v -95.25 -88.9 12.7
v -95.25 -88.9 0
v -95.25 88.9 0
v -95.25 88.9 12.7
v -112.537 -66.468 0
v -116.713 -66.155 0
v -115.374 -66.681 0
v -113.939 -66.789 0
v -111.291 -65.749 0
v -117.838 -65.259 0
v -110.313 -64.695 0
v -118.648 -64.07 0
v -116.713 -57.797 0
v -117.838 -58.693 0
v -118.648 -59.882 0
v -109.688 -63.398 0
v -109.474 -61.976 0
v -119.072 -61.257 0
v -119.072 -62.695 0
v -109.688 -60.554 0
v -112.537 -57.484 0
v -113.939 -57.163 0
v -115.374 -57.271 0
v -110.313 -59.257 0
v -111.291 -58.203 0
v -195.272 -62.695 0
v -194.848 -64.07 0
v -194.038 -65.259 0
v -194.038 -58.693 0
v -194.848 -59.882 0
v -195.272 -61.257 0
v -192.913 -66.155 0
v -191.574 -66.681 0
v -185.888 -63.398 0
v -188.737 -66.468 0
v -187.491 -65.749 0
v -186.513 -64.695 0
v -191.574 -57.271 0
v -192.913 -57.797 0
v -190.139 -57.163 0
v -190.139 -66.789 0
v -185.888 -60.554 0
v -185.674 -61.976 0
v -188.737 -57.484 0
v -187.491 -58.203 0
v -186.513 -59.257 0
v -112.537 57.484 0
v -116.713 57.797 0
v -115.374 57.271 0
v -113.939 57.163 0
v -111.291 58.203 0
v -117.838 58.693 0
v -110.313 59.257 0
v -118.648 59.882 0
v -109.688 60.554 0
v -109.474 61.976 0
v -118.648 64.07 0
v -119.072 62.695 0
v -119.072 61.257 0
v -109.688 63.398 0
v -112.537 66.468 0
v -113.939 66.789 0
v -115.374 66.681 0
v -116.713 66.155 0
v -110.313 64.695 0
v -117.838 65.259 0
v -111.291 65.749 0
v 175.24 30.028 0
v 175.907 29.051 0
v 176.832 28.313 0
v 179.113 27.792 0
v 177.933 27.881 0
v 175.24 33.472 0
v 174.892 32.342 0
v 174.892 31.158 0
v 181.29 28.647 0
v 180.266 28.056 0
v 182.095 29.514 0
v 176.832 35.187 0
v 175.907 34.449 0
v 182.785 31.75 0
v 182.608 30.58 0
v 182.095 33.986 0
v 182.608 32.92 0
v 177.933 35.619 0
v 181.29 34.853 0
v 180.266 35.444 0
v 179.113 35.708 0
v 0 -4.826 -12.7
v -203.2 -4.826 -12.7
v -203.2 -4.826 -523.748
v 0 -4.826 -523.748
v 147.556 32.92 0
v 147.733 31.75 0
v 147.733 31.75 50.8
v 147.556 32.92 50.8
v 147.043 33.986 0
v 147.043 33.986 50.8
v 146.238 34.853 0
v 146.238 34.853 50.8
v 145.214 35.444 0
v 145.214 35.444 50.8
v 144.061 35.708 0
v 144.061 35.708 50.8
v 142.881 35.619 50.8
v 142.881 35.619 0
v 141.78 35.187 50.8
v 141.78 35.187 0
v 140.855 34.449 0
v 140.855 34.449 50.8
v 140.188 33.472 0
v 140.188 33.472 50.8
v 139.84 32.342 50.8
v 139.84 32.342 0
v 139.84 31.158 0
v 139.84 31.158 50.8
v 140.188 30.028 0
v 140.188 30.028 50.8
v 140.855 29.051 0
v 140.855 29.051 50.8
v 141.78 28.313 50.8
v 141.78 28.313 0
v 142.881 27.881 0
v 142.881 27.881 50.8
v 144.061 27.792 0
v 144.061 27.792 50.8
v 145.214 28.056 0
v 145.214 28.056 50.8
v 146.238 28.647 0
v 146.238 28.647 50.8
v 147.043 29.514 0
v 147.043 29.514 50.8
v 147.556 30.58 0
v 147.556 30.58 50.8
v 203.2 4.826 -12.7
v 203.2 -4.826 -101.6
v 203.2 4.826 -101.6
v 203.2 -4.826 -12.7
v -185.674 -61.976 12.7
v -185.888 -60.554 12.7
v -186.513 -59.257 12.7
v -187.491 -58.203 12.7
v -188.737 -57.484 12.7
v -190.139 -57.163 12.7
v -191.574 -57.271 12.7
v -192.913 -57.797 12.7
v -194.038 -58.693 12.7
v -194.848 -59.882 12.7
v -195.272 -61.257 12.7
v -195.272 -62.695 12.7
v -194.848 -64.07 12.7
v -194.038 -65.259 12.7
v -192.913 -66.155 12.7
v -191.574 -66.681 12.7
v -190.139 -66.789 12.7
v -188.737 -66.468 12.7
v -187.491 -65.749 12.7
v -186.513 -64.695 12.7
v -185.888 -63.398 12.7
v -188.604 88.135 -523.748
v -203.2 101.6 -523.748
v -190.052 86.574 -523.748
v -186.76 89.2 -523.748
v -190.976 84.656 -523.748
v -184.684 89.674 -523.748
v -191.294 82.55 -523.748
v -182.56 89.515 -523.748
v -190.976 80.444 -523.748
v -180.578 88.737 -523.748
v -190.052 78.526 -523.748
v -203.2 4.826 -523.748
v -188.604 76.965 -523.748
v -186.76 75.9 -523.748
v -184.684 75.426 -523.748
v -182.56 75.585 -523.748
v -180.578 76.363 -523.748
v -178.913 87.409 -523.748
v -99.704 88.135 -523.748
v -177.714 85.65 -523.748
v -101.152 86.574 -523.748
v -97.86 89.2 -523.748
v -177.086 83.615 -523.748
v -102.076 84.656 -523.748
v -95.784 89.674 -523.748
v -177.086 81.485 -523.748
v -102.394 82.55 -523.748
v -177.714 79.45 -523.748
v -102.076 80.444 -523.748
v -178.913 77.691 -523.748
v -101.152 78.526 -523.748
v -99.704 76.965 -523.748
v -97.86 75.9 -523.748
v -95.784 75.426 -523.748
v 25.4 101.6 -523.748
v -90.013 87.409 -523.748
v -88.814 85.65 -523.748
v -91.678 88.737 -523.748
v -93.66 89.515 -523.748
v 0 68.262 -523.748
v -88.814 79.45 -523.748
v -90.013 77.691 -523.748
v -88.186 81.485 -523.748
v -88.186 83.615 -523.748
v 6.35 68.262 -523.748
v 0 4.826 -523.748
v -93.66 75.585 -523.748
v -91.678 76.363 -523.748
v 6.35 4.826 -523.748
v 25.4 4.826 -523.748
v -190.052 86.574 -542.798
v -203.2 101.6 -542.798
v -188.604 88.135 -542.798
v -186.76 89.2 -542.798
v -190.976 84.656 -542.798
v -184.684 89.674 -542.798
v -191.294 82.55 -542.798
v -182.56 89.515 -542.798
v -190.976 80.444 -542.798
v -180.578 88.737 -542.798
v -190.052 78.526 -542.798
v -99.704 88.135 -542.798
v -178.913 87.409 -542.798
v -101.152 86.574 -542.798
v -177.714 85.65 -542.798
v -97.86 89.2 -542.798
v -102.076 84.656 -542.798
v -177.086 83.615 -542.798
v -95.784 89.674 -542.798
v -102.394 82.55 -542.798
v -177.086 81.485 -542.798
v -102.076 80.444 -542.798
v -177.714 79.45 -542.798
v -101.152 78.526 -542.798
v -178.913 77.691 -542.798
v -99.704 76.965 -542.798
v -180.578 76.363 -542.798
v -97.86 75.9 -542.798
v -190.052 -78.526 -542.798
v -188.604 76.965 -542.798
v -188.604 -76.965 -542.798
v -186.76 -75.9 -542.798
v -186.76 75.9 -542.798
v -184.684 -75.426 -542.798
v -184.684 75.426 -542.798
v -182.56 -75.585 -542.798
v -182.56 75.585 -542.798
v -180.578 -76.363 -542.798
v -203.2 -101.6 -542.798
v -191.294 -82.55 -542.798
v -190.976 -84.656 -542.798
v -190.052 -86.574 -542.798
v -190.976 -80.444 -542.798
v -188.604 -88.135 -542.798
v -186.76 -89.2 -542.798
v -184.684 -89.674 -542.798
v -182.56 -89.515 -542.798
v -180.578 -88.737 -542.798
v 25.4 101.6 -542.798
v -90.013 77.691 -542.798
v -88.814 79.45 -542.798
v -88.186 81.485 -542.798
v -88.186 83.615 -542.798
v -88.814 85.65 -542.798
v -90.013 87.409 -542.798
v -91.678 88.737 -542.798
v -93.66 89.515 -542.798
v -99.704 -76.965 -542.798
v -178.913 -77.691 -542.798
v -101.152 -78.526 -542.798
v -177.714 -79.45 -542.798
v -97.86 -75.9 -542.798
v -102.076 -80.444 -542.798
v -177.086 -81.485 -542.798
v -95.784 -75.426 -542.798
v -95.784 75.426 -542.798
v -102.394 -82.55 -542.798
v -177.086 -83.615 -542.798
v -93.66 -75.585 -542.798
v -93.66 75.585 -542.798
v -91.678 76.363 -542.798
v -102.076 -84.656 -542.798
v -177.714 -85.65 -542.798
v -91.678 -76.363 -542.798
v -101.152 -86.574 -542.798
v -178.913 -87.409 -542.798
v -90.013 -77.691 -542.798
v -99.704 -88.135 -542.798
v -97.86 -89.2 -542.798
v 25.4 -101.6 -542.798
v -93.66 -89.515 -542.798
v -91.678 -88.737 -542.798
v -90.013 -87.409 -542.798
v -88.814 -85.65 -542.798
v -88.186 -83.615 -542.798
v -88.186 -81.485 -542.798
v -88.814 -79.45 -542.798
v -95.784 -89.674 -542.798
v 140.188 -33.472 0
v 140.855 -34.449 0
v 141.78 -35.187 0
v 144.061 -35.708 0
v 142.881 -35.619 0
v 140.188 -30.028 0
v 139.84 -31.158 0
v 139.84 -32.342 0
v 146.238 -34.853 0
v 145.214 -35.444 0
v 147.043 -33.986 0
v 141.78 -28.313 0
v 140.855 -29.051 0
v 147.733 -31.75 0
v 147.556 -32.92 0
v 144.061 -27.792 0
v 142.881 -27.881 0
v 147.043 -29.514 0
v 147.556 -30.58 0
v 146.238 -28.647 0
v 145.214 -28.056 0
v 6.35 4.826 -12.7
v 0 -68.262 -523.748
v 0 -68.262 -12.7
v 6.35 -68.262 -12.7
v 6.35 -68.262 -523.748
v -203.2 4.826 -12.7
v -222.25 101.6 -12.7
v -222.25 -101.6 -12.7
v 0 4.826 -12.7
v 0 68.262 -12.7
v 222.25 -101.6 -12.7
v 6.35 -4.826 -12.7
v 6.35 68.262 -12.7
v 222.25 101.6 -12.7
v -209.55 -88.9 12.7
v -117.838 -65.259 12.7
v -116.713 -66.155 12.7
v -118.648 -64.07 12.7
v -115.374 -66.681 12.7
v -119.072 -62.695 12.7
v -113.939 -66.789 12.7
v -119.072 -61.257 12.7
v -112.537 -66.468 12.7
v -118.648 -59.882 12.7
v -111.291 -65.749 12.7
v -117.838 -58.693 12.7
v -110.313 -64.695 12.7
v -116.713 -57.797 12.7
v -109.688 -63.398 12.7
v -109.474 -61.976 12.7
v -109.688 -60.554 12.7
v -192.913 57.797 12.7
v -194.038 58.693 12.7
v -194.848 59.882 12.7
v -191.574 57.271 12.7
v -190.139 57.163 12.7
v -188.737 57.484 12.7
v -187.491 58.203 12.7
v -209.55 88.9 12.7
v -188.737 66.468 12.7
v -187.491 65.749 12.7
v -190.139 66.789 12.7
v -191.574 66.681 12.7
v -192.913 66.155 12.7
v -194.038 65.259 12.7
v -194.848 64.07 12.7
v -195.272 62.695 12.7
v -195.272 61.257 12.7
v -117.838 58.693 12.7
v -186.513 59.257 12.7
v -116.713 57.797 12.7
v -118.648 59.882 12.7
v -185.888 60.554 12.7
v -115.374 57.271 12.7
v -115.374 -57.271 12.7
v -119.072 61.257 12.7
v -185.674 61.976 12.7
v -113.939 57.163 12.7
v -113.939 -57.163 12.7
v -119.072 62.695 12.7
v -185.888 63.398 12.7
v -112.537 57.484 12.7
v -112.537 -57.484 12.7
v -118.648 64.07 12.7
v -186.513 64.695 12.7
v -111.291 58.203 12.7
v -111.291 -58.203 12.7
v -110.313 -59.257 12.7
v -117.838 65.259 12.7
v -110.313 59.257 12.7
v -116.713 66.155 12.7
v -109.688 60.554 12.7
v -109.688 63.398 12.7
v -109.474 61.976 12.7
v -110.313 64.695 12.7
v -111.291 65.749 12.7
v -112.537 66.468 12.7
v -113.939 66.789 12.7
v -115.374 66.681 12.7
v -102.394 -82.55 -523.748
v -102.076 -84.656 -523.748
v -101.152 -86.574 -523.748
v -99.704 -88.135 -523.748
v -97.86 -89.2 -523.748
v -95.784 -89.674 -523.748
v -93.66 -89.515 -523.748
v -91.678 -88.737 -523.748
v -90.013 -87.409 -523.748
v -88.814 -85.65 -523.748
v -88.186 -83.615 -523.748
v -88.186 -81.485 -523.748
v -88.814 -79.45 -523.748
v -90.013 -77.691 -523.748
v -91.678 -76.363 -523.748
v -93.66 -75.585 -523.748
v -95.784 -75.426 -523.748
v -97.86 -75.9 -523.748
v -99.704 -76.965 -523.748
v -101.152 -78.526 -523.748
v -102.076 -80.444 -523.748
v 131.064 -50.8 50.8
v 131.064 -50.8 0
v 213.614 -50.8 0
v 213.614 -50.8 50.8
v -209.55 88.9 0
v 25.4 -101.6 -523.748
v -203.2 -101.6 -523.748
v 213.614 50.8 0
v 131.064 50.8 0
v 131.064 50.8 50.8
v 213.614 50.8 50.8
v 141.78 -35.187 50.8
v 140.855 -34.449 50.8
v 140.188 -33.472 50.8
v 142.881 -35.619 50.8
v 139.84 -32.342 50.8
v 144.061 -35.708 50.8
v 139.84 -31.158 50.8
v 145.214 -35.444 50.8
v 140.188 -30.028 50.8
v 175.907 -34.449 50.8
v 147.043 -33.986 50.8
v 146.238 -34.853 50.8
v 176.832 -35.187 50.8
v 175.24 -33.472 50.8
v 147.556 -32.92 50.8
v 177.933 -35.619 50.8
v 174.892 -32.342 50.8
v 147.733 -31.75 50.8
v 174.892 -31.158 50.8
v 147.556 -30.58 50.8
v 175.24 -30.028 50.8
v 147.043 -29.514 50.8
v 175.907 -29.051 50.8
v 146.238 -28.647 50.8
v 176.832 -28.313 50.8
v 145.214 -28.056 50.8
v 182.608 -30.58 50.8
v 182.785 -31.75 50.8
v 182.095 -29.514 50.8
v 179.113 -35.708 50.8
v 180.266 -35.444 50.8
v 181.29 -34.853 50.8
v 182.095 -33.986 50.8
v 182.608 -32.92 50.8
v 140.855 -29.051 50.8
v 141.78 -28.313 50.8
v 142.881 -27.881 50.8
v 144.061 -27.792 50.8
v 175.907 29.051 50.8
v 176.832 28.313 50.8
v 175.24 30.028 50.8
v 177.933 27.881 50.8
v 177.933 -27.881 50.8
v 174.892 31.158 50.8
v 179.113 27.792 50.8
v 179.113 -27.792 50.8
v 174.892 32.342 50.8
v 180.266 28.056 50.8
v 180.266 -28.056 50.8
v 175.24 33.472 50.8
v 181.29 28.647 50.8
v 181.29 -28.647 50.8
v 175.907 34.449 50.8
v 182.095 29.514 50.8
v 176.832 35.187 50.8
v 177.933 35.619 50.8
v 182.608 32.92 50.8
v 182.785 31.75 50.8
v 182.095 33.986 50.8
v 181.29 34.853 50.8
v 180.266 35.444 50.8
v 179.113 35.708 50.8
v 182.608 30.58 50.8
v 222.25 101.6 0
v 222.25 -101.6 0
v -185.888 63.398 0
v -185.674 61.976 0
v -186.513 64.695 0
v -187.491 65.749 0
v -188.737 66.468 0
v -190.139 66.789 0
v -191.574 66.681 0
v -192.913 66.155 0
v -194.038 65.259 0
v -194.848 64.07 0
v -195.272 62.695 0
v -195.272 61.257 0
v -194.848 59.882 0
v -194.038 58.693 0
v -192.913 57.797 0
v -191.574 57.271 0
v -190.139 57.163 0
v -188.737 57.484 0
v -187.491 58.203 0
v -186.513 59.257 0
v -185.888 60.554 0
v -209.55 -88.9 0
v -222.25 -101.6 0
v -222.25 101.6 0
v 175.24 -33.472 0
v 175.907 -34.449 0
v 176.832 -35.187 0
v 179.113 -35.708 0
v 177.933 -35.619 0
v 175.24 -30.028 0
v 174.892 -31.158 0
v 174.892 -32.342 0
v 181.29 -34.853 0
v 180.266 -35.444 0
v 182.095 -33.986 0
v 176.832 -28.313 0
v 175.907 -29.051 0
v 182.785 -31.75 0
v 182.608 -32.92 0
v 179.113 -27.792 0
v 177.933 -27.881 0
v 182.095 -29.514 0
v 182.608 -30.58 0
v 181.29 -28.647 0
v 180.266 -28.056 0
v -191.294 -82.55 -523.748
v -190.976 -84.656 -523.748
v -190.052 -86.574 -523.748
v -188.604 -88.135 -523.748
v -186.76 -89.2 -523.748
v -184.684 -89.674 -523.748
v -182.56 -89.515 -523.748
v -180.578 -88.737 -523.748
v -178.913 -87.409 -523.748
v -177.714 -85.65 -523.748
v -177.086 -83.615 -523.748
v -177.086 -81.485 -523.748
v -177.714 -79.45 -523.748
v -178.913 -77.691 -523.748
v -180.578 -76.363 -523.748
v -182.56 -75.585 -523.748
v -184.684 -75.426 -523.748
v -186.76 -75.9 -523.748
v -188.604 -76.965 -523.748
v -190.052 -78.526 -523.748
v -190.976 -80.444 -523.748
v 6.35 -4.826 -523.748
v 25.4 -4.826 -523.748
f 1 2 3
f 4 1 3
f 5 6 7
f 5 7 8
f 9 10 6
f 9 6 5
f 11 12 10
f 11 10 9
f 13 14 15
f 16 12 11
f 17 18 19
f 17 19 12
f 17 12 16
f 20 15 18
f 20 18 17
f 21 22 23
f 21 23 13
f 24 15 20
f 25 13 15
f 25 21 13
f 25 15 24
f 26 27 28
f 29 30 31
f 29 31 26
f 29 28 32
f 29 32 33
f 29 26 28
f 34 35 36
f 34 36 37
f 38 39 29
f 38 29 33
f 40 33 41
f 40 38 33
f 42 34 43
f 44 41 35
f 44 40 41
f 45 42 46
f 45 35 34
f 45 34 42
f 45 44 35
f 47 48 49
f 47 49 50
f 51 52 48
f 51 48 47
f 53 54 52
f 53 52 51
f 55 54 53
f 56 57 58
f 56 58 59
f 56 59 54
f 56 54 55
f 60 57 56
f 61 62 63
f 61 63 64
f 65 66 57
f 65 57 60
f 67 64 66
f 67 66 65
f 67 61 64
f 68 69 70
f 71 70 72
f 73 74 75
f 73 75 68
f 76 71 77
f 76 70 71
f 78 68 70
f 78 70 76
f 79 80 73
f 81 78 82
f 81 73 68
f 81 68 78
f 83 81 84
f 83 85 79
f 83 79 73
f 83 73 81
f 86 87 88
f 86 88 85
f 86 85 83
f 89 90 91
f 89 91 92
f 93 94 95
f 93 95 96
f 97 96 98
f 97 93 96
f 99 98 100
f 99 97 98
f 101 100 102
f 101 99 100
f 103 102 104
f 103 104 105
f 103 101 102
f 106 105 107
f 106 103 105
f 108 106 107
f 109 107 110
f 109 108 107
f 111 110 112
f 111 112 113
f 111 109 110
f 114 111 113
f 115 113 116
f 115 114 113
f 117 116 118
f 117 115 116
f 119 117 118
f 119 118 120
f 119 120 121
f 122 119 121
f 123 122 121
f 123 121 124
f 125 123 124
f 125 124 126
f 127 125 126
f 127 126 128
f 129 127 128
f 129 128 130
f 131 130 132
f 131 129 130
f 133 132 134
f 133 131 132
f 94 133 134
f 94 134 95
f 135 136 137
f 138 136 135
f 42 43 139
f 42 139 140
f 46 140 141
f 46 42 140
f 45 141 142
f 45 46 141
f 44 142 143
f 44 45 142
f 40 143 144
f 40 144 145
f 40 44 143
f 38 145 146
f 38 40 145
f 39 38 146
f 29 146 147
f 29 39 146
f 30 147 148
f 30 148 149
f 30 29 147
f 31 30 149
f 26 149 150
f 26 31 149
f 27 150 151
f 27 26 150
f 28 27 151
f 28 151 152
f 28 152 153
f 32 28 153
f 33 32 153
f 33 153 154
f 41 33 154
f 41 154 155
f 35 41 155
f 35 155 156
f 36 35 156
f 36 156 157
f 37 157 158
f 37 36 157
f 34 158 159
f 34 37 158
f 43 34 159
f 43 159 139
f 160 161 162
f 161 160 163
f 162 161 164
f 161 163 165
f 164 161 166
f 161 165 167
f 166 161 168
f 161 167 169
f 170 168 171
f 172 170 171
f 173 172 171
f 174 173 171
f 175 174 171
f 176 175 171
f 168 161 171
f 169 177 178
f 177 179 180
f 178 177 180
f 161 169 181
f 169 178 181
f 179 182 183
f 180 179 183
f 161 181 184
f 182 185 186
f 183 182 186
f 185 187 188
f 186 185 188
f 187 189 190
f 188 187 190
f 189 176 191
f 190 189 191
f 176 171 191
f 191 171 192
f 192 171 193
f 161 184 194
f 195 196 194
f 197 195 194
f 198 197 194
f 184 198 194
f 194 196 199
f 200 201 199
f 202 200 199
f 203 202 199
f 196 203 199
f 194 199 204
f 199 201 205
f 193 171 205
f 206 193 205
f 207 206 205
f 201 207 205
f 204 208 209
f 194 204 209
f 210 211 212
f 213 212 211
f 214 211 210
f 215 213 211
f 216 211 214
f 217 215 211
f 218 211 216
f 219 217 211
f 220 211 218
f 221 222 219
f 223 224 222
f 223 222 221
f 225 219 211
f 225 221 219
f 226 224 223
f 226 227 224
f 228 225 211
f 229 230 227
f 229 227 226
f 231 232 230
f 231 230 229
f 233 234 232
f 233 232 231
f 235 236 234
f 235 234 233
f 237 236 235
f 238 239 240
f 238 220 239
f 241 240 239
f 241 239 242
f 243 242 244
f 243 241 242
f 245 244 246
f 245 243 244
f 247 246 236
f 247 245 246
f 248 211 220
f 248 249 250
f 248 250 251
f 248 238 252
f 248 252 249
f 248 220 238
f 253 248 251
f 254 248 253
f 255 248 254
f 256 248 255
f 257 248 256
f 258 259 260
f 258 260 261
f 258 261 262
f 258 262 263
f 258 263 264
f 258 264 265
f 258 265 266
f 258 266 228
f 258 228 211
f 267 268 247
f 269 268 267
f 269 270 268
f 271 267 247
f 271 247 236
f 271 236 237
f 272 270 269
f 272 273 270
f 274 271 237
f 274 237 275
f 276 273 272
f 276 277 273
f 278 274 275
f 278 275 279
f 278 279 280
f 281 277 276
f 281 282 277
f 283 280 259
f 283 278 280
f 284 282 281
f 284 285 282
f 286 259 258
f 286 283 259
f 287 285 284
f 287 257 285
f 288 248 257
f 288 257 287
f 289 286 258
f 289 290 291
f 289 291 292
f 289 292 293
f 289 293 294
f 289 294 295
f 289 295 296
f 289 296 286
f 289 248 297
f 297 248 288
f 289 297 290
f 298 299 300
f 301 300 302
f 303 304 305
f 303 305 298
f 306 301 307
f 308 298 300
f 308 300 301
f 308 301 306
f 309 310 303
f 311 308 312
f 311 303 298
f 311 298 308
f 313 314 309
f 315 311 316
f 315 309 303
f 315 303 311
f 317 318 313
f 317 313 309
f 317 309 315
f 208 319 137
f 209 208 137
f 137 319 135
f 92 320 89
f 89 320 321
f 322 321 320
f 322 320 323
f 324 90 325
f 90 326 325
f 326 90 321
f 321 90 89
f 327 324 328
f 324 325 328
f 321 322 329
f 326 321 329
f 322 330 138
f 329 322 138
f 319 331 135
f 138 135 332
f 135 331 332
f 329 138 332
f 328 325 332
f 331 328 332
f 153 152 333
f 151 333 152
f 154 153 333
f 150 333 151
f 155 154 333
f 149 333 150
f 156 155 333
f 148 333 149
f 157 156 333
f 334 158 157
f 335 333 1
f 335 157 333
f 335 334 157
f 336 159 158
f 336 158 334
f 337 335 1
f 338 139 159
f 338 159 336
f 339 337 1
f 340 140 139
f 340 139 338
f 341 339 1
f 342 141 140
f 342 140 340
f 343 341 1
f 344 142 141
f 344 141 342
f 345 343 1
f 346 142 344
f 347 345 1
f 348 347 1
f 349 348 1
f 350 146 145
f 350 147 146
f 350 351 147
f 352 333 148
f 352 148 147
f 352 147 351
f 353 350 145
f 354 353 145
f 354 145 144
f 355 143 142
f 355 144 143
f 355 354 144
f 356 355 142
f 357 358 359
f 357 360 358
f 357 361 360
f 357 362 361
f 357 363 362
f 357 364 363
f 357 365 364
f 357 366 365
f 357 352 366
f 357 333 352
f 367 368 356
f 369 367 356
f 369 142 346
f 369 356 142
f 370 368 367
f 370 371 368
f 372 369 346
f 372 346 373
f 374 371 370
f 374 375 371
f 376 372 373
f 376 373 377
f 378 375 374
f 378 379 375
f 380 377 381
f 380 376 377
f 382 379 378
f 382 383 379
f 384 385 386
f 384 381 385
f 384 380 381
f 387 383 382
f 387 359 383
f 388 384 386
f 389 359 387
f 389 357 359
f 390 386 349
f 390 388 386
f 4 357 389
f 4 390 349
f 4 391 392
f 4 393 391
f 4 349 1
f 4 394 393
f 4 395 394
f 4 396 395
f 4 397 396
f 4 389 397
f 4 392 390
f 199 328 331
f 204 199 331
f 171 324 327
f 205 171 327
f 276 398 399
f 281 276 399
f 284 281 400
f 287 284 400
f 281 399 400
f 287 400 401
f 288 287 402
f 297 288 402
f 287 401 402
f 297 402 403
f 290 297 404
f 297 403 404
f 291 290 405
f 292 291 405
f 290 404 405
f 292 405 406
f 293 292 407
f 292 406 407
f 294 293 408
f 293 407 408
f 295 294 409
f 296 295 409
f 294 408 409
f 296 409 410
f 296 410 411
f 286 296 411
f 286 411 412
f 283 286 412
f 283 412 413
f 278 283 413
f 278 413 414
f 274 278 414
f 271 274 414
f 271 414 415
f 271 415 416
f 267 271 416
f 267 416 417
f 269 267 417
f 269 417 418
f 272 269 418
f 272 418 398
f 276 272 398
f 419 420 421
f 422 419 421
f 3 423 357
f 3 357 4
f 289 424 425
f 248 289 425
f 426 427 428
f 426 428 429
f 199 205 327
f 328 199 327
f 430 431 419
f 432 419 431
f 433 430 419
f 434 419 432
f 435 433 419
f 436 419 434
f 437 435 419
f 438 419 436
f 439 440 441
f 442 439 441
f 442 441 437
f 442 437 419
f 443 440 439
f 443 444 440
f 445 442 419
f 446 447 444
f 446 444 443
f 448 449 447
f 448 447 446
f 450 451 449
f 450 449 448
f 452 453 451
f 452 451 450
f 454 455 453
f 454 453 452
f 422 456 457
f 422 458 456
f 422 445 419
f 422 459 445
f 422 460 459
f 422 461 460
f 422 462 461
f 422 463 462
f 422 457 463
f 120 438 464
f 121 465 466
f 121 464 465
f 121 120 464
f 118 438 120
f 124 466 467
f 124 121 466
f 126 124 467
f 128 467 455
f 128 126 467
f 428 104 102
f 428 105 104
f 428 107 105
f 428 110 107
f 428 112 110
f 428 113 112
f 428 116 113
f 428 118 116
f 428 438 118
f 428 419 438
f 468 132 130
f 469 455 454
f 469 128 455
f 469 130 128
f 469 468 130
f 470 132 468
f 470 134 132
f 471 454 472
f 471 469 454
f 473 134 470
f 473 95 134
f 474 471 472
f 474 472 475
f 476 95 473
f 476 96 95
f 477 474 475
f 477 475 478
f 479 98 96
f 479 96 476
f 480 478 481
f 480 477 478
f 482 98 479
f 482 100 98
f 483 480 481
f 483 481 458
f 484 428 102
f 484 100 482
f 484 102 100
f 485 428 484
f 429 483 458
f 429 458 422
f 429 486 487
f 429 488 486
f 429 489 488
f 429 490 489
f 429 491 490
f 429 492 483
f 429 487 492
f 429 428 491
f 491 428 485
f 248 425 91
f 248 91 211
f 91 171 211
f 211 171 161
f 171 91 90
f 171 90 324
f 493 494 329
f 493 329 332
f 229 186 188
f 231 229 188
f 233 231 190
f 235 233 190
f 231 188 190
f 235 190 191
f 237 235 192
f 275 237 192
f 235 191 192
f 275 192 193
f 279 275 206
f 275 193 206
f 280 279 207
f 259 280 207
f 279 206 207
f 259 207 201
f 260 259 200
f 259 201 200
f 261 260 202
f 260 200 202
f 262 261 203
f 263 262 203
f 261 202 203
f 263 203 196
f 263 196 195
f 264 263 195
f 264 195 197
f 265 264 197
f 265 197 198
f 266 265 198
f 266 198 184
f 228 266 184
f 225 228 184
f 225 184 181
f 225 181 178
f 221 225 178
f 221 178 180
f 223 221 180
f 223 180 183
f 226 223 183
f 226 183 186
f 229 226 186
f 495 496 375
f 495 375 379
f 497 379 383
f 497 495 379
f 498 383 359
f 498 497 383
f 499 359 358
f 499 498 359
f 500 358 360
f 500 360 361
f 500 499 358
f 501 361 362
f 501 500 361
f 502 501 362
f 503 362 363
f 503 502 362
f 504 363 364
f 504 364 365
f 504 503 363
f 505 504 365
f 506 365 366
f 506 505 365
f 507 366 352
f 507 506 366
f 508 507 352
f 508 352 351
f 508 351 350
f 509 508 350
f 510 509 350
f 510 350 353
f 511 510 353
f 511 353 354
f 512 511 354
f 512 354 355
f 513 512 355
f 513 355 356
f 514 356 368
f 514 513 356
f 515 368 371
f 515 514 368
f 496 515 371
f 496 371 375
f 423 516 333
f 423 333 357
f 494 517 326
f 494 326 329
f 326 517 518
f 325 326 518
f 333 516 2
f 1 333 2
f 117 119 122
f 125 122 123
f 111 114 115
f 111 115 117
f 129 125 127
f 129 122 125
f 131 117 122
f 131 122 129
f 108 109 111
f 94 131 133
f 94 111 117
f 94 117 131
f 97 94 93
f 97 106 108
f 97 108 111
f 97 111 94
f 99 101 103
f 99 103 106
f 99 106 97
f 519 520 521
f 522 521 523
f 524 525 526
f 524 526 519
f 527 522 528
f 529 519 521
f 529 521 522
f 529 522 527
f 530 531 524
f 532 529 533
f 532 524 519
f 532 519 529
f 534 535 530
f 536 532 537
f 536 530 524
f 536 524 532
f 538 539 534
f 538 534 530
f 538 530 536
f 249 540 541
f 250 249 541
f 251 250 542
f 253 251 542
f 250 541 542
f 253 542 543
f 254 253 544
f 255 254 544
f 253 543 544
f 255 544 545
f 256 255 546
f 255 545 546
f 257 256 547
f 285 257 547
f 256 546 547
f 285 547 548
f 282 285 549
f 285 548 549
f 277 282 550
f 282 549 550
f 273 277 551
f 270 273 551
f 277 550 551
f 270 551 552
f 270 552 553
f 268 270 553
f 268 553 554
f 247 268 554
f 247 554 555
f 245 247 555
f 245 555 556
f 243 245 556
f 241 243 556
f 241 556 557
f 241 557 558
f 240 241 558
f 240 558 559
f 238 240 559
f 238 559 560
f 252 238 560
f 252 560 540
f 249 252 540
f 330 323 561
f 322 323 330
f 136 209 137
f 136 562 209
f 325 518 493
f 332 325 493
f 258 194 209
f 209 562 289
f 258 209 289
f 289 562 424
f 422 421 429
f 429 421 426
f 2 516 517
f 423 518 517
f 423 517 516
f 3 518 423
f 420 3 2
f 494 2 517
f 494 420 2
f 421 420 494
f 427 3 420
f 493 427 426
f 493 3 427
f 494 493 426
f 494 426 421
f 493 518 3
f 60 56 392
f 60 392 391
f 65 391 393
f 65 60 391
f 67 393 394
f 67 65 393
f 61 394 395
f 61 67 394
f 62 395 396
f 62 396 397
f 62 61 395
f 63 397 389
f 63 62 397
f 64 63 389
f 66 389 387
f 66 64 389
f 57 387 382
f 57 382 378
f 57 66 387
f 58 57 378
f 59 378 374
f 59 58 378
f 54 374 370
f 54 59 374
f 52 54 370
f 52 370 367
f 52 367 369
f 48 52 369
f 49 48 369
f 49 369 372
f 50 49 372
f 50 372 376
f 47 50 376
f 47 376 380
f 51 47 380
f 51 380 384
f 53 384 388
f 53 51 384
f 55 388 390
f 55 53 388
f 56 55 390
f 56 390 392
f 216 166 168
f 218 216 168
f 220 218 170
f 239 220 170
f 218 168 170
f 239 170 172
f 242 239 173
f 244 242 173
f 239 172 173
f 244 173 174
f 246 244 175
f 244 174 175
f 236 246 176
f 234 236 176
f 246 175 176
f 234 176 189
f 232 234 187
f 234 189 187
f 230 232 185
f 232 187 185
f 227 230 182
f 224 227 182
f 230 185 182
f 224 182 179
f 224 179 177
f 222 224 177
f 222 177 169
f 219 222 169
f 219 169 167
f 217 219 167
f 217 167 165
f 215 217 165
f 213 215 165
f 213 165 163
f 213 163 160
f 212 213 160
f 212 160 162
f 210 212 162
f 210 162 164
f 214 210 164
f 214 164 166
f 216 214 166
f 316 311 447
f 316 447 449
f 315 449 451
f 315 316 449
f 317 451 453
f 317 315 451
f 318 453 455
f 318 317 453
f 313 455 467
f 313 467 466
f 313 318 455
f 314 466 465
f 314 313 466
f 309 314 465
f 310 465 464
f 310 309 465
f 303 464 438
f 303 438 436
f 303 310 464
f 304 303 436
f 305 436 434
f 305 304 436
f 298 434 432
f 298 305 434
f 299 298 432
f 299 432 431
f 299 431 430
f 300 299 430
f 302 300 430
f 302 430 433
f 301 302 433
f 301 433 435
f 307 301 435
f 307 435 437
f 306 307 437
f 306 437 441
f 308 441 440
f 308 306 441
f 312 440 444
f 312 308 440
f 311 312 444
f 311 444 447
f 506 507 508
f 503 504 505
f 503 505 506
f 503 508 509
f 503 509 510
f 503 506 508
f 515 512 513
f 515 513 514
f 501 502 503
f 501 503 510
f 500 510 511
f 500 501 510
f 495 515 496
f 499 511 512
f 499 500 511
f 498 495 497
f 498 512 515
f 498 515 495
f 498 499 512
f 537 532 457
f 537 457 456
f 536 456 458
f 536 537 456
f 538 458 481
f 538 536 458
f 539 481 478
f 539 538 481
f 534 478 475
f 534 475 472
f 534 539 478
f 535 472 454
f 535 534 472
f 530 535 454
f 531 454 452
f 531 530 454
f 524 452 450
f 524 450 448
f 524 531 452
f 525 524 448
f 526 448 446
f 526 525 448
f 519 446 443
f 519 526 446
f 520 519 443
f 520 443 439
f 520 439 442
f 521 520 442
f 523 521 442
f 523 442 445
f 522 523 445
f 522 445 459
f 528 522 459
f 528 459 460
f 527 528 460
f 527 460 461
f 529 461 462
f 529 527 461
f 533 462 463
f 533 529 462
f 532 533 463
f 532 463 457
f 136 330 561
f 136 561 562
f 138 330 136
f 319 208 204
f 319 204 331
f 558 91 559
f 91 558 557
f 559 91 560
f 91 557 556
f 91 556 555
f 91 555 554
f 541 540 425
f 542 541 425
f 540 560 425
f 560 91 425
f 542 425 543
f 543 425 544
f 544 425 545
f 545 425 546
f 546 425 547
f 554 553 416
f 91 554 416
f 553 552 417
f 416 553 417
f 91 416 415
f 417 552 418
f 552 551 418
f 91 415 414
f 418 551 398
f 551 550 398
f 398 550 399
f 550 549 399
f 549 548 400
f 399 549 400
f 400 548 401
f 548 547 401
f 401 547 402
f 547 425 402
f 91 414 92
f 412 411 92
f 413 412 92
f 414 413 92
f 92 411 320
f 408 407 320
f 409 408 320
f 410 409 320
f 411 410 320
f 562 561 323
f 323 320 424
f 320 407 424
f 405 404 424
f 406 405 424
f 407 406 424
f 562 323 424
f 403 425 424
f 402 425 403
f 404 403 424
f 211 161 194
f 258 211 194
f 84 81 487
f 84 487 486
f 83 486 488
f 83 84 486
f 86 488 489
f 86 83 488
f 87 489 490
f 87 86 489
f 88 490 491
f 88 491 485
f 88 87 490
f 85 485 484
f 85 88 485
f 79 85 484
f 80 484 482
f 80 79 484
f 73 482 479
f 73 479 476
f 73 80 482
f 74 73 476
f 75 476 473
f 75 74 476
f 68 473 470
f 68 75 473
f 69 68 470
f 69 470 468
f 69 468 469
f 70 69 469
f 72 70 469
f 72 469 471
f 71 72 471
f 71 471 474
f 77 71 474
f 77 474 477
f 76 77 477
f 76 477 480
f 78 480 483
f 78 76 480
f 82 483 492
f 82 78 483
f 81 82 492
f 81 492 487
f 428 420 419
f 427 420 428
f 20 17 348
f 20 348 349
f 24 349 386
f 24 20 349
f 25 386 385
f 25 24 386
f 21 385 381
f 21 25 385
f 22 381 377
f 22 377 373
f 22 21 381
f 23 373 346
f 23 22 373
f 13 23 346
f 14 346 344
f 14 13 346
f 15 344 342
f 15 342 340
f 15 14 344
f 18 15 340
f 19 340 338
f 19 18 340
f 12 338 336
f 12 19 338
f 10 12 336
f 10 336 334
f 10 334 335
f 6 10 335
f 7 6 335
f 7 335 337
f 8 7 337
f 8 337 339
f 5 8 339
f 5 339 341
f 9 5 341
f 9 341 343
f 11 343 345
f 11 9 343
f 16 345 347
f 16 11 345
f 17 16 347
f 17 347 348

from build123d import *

# Parameters (mm, degrees)
F0_W      = 444.5
F0_H      = 203.2
F1_DEPTH  = 12.7
F3_DEPTH  = 4.826
F4_W      = 6.35
F4_H      = 511.048
F5_DEPTH  = 68.2625
F7_DEPTH  = 19.05
F9_D      = 14.2875
F9_DEPTH  = 38.1
F10_W     = 114.3
F10_H     = 177.8
F10_R     = 4.826
F11_DEPTH = 12.7
F12_W     = 82.55
F12_H     = 101.6
F12_R     = 3.96875
F13_DEPTH = 50.8


with BuildPart() as f1:
    # F0 (on Top) → F1 (new body)
    with BuildSketch(Plane.XY):
        Rectangle(F0_W, F0_H)
    extrude(amount=-F1_DEPTH)

    # F2 (on Front) → F3 (join, symmetric)
    with BuildSketch(Plane.XZ):
        Polygon((203.2, -12.7), (-203.2, -12.7), (-203.2, -523.748), (25.4, -523.748), (203.2, -101.6), align=None)
    extrude(amount=F3_DEPTH, both=True)

    # F4 (on Front) → F5 (join, symmetric)
    with BuildSketch(Plane.XZ):
        with Locations((3.175, -268.224)):
            Rectangle(F4_W, F4_H)
    extrude(amount=F5_DEPTH, both=True)

    # F6 (on face) → F7 (join)
    with BuildSketch(Plane(origin=(0, 0, -523.748), x_dir=(1, 0, 0), z_dir=(0, 0, -1))):
        Polygon((25.4, 101.6), (-203.2, 101.6), (-203.2, 4.826), (-203.2, -4.826), (-203.2, -101.6), (25.4, -101.6), (25.4, -4.826), (25.4, 4.826), align=None)
    extrude(amount=F7_DEPTH)

    # F9
    with Locations(Plane(origin=(0, 0, -542.798), x_dir=(1, 0, 0), z_dir=(0, 0, -1))):
        with Locations((-95.25, 82.55), (-184.15, 82.55), (-95.25, -82.55), (-184.15, -82.55)):
            Hole(F9_D / 2, depth=F9_DEPTH)

    # F10 (on face) → F11 (join)
    with BuildSketch(Plane.XY):
        with Locations((-152.4, 0)):
            Rectangle(F10_W, F10_H)
        with Locations((-190.5, -61.976)):
            Circle(F10_R, mode=Mode.SUBTRACT)
        with Locations((-114.3, -61.976)):
            Circle(F10_R, mode=Mode.SUBTRACT)
        with Locations((-190.5, 61.976)):
            Circle(F10_R, mode=Mode.SUBTRACT)
        with Locations((-114.3, 61.976)):
            Circle(F10_R, mode=Mode.SUBTRACT)
    extrude(amount=F11_DEPTH)

    # F12 (on face) → F13 (join)
    with BuildSketch(Plane.XY):
        with Locations((172.339, 0)):
            Rectangle(F12_W, F12_H)
        with Locations((143.764, -31.75)):
            Circle(F12_R, mode=Mode.SUBTRACT)
        with Locations((178.816, -31.75)):
            Circle(F12_R, mode=Mode.SUBTRACT)
        with Locations((143.764, 31.75)):
            Circle(F12_R, mode=Mode.SUBTRACT)
        with Locations((178.816, 31.75)):
            Circle(F12_R, mode=Mode.SUBTRACT)
    extrude(amount=F13_DEPTH)


solid = f1.part
